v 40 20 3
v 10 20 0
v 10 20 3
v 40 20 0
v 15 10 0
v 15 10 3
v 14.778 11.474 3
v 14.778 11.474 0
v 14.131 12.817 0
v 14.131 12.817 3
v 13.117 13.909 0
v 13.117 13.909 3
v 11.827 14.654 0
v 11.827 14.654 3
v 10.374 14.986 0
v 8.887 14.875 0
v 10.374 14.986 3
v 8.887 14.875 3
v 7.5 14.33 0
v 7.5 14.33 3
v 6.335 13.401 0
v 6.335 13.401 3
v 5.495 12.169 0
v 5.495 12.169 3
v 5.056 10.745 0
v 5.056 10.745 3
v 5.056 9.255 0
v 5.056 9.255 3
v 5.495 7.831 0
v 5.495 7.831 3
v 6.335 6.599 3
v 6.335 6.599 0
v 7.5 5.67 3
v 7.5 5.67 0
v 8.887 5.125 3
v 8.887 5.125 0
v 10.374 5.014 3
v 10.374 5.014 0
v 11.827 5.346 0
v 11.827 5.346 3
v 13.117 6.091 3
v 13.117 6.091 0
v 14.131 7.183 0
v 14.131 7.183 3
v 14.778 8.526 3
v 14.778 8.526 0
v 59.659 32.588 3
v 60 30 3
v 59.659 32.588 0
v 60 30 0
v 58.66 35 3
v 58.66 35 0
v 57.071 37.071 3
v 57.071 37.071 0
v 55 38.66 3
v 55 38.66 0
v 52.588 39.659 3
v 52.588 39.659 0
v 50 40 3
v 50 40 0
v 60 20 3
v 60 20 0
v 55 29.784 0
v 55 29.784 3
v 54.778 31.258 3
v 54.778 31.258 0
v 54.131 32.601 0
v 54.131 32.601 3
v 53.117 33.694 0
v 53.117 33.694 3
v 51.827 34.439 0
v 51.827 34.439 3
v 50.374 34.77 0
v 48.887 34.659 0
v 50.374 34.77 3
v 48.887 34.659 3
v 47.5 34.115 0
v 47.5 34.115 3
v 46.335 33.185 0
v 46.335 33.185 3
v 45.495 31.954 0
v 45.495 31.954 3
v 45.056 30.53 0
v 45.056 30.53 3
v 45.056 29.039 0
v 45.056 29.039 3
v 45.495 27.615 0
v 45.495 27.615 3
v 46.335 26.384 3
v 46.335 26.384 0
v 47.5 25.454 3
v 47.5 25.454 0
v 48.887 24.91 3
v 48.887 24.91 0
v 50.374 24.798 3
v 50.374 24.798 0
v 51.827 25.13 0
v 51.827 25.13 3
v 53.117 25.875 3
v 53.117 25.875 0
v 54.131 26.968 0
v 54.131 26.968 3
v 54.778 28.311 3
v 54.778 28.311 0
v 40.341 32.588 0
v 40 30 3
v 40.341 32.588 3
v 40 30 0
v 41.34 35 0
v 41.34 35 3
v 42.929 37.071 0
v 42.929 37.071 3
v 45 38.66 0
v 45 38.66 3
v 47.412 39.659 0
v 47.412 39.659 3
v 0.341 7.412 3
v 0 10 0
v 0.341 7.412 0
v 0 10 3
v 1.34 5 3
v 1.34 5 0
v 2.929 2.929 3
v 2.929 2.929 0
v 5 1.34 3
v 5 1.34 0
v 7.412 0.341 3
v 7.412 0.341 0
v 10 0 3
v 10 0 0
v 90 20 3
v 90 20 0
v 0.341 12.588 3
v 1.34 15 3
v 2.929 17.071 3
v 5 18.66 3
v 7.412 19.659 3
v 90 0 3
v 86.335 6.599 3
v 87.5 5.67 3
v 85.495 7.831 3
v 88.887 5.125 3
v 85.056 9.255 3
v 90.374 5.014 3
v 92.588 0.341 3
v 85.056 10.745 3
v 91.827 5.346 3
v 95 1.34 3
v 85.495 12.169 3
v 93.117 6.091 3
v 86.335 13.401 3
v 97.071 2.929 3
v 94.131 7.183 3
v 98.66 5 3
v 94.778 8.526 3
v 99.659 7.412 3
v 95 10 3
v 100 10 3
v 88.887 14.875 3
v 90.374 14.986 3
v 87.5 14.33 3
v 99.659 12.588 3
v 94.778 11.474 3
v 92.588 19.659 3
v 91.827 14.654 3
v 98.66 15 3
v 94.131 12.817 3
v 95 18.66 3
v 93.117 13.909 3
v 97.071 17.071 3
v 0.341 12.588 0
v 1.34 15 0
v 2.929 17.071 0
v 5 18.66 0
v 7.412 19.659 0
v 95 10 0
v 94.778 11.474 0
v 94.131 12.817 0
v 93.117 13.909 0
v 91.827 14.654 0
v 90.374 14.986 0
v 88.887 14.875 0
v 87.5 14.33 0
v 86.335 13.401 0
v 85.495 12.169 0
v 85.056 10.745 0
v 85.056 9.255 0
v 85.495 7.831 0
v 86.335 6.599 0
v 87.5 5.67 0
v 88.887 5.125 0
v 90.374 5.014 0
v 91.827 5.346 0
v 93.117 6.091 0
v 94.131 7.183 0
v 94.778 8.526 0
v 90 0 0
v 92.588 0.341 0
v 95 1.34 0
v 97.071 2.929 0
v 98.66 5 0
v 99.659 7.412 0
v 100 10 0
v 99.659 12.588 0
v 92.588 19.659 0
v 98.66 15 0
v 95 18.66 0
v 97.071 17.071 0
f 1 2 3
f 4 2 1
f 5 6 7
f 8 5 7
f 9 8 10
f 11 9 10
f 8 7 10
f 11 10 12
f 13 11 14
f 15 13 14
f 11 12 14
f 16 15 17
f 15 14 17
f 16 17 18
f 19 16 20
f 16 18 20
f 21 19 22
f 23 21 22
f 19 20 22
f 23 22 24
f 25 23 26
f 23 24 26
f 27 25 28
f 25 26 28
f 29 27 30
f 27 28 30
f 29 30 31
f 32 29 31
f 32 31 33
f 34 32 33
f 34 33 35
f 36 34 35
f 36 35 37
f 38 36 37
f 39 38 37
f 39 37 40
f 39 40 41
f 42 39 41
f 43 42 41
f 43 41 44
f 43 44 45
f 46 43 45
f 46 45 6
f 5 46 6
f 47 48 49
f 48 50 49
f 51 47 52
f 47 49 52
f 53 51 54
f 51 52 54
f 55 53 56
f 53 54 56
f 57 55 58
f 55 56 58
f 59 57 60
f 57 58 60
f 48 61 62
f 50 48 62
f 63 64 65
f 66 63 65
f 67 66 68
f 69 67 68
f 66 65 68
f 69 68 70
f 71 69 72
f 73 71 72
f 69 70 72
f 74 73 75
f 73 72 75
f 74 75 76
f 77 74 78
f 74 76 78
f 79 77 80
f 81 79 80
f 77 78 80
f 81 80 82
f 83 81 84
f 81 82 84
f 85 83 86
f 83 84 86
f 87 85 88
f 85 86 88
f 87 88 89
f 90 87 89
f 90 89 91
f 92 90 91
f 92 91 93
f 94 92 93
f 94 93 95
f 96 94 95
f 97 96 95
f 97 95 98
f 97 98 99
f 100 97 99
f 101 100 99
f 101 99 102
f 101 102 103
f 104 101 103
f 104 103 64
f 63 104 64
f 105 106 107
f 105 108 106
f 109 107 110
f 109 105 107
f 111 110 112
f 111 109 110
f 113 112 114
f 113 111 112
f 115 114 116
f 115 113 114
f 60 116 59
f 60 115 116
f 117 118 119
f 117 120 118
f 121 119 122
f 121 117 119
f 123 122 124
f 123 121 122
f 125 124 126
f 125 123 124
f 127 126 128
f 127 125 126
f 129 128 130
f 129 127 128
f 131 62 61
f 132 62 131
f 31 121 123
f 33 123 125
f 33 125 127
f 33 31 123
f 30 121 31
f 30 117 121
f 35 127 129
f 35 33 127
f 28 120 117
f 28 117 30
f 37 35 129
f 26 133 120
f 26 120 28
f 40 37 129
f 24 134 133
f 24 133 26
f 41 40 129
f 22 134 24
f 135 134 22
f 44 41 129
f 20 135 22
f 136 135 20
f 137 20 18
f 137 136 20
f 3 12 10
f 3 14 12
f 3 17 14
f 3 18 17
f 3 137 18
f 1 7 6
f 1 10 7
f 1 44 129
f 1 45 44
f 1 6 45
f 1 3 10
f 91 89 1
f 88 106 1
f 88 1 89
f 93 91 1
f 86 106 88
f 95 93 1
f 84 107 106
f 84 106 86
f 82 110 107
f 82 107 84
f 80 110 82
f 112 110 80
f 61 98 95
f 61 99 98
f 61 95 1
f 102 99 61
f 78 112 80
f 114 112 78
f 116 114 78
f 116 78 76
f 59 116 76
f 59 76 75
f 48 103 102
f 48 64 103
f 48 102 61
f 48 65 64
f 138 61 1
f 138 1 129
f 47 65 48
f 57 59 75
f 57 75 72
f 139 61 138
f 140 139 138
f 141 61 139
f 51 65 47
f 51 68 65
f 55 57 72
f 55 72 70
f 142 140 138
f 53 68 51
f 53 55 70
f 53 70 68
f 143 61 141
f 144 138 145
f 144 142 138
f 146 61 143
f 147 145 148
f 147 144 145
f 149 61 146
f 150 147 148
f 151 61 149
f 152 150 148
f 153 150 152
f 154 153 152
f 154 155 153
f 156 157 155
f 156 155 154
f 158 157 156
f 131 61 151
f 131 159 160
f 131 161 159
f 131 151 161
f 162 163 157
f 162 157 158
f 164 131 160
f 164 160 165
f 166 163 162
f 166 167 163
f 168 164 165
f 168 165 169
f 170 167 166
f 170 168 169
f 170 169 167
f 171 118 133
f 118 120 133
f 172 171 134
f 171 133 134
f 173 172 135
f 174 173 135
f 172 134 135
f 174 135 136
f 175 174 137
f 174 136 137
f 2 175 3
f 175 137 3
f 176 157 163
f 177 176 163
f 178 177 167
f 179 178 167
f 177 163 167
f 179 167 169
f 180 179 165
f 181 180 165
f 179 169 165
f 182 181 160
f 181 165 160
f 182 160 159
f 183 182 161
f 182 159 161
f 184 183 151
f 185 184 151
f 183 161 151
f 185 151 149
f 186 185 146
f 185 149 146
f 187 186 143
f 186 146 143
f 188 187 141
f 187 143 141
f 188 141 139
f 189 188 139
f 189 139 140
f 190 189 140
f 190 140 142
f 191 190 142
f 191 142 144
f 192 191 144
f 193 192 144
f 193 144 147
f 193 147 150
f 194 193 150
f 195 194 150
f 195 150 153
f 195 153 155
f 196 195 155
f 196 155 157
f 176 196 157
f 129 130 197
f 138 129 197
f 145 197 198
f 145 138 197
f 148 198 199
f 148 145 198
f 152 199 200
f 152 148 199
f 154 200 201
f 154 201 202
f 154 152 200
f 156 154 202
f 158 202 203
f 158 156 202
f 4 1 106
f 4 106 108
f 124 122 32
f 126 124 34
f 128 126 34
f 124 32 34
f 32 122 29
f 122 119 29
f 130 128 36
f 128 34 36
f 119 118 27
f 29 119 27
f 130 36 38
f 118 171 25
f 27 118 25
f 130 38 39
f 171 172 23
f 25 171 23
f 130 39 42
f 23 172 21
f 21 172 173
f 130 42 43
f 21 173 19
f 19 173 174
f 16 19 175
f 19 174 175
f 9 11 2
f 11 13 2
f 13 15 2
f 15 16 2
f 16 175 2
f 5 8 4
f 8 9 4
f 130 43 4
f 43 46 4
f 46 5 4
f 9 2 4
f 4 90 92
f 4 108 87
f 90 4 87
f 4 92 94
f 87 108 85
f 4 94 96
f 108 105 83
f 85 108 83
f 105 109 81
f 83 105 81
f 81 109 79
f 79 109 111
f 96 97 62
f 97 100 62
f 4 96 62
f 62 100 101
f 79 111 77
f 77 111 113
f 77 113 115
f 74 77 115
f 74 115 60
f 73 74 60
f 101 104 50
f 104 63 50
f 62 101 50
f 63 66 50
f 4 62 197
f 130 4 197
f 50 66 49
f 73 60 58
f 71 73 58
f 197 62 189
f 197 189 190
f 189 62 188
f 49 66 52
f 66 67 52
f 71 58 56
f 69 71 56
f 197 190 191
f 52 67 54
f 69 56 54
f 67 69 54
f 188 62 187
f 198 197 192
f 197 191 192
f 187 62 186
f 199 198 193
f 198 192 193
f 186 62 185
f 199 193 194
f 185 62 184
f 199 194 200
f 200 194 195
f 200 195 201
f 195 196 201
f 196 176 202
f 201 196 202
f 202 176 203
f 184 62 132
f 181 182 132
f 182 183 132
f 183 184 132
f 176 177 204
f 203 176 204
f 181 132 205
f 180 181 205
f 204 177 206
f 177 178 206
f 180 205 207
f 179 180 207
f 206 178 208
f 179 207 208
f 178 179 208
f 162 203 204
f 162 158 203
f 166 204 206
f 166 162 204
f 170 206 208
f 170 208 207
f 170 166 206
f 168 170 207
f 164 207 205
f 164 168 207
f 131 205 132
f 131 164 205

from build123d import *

# Parameters (mm, degrees)
SKETCH_1_W          = 100
SKETCH_1_H          = 20
EXTRUDE_1_DEPTH     = 3
FILLET_1_R          = 10
SKETCH_4_W          = 20
SKETCH_4_H          = 3
EXTRUDE_2_DEPTH     = 20
FILLET_2_R          = 10
SKETCH_5_R          = 5
CUT_EXTRUDE_1_DEPTH = 10
SKETCH_5_3_R        = 5
CUT_EXTRUDE_2_DEPTH = 10


with BuildPart() as part:
    # ｽｹｯﾁ1 → ﾎﾞｽ - 押し出し1 (new body)
    with BuildSketch(Plane.XY):
        with Locations((50, 10)):
            Rectangle(SKETCH_1_W, SKETCH_1_H)
    extrude(amount=EXTRUDE_1_DEPTH)

    # ﾌｨﾚｯﾄ1
    fillet_1_edges = [part.edges().sort_by_distance(p)[0] for p in [
        (100, 0, 1.5),
        (100, 20, 1.5),
        (0, 0, 1.5),
        (0, 20, 1.5),
    ]]
    fillet(fillet_1_edges, radius=FILLET_1_R - 0.0001)  # a hair under: the kernel refuses the full size

    # ｽｹｯﾁ4 → ﾎﾞｽ - 押し出し2 (add)
    with BuildSketch(Plane(origin=(0, 20, 0), x_dir=(1, 0, 0), z_dir=(0, 1, 0))):
        with Locations((50, -1.5)):
            Rectangle(SKETCH_4_W, SKETCH_4_H)
    extrude(amount=EXTRUDE_2_DEPTH)

    # ﾌｨﾚｯﾄ2
    fillet_2_edges = [part.edges().sort_by_distance(p)[0] for p in [
        (40, 40, 1.5),
        (60, 40, 1.5),
    ]]
    fillet(fillet_2_edges, radius=FILLET_2_R - 0.0001)  # a hair under: the kernel refuses the full size

    # ｽｹｯﾁ5 → ｶｯﾄ - 押し出し1 (cut)
    with BuildSketch(Plane.XY.offset(3)):
        with Locations((10, 10)):
            Circle(SKETCH_5_R)
    extrude(amount=-CUT_EXTRUDE_1_DEPTH, mode=Mode.SUBTRACT)

    # ｽｹｯﾁ5<3> → ｶｯﾄ - 押し出し2 (cut)
    with BuildSketch(Plane.XY.offset(3)):
        with Locations((50, 29.784394475)):
            Circle(SKETCH_5_3_R)
        with Locations((10, 10)):
            Circle(SKETCH_5_3_R)
        with Locations((90, 10)):
            Circle(SKETCH_5_3_R)
    extrude(amount=-CUT_EXTRUDE_2_DEPTH, mode=Mode.SUBTRACT)


solid = part.part
